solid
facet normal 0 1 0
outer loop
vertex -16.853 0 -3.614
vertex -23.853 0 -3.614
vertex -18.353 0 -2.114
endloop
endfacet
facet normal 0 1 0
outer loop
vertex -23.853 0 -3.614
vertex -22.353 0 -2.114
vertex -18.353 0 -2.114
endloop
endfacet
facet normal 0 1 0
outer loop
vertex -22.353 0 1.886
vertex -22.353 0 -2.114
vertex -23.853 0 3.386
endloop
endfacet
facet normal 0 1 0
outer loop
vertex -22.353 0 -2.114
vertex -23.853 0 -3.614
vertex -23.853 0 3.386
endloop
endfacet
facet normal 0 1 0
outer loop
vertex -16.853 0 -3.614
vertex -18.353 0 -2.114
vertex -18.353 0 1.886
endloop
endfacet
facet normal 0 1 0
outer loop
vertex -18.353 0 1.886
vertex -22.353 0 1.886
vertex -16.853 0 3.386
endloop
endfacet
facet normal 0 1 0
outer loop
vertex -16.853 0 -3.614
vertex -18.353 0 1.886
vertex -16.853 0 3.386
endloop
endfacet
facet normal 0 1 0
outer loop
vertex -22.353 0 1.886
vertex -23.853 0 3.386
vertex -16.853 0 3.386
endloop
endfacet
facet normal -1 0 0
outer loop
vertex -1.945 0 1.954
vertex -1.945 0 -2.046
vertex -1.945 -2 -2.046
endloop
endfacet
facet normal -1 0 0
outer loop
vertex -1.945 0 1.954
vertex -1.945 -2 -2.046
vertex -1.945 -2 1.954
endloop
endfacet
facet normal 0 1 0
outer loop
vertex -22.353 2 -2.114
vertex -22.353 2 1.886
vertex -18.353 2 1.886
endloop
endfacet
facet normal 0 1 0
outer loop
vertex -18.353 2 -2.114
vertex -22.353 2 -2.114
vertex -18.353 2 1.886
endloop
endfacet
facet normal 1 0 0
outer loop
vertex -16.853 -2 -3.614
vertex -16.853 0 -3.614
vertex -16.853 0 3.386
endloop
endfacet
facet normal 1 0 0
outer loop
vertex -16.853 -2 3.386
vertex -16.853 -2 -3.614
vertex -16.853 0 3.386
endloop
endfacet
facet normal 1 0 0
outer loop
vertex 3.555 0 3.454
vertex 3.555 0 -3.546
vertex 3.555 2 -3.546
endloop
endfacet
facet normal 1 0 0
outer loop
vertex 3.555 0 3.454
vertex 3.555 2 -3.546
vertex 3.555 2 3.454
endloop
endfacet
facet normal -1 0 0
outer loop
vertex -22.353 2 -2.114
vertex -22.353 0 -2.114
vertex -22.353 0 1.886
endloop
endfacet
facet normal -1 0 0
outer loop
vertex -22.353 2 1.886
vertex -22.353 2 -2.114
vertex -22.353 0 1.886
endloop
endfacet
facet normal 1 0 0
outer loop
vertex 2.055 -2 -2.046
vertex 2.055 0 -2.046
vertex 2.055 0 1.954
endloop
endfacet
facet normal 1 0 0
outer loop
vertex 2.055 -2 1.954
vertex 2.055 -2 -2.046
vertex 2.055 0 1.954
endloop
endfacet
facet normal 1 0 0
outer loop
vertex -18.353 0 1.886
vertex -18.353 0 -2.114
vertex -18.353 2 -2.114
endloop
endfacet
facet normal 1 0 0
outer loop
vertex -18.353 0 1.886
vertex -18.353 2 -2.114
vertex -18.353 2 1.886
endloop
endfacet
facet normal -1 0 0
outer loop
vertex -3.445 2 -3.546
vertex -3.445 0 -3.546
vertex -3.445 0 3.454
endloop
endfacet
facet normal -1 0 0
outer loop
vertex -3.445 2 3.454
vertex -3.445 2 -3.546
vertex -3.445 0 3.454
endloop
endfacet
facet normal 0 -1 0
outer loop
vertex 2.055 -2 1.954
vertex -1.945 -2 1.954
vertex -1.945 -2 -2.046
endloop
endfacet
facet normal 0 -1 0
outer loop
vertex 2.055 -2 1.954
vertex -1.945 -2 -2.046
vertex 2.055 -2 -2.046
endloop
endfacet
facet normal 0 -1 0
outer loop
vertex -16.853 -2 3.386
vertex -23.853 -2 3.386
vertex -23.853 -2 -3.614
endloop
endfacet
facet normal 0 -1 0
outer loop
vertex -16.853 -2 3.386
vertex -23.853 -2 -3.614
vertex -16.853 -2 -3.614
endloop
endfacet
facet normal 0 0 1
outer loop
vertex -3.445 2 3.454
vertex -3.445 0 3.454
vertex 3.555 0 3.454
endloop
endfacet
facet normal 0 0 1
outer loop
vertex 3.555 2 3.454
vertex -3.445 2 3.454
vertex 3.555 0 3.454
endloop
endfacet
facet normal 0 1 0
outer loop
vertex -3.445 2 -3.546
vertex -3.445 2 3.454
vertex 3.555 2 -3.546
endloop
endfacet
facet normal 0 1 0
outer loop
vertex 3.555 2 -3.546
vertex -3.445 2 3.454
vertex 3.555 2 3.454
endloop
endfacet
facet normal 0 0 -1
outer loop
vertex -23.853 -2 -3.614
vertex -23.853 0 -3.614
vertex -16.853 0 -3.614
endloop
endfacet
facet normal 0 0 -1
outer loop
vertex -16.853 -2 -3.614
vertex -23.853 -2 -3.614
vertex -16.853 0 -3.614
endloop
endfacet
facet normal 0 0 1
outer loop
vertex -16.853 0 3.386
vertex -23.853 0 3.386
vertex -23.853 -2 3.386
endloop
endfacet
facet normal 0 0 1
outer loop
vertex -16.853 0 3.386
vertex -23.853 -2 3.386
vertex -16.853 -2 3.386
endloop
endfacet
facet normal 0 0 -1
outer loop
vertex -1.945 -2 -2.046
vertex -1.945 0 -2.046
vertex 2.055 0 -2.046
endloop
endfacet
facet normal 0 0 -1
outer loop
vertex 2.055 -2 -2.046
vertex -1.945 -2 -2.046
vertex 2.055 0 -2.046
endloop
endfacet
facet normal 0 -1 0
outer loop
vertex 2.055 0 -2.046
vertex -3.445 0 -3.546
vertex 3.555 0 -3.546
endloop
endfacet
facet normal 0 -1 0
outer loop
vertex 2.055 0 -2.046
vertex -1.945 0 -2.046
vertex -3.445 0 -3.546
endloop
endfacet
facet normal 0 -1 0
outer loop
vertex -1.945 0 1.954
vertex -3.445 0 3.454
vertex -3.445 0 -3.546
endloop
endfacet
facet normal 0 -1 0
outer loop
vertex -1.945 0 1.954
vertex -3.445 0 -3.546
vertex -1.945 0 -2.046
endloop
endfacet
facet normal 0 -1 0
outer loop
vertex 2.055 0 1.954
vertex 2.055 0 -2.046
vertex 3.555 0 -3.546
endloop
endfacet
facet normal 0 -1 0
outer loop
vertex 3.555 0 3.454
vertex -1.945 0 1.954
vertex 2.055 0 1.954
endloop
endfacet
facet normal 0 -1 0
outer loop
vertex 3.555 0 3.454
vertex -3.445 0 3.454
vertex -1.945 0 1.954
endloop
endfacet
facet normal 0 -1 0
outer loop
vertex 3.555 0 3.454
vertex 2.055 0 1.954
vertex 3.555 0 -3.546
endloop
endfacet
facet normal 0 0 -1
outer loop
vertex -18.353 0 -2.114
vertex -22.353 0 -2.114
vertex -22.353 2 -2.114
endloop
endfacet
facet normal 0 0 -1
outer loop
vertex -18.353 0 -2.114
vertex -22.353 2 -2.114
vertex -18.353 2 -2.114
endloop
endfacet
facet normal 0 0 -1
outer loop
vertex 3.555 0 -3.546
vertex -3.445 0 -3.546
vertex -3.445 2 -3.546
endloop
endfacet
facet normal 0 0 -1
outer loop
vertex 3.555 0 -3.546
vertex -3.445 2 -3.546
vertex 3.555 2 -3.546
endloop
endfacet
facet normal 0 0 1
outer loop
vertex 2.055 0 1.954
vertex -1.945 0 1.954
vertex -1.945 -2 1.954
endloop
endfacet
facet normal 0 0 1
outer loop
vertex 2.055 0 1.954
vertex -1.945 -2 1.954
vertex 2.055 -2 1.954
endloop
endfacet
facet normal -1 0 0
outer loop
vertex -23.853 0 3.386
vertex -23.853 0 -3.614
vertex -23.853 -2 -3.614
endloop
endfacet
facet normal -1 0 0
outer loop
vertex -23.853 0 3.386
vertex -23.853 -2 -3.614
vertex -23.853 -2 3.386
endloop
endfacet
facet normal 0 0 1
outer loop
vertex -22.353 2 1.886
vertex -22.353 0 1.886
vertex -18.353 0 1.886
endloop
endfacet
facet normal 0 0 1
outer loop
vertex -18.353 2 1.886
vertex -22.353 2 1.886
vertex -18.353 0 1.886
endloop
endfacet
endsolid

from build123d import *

# Parameters (mm, degrees)
F0_W     = 4
F0_H     = 4
F1_DEPTH = 2
F0_W_2   = 7
F0_H_2   = 7
F2_DEPTH = 2
F3_DEPTH = 2
F4_DEPTH = 2


with BuildPart() as f1:
    # F0 (on Front) → F1 (new body)
    with BuildSketch(Plane.XZ):
        with Locations((0.055232, -0.046305)):
            Rectangle(F0_W, F0_H)
    extrude(amount=F1_DEPTH)

    # F0 (on Front) → F2 (join)
    with BuildSketch(Plane.XZ):
        with Locations((0.055232, -0.046305)):
            Rectangle(F0_W_2, F0_H_2)
        with Locations((0.055232, -0.046305)):
            Rectangle(F0_W, F0_H, mode=Mode.SUBTRACT)
        with Locations((0.055232, -0.046305)):
            Rectangle(F0_W, F0_H)
    extrude(amount=-F2_DEPTH)


with BuildPart() as f3:
    # F0 (on Front) → F3 (new body)
    with BuildSketch(Plane.XZ):
        with Locations((-20.352559, -0.113686)):
            Rectangle(F0_W, F0_H)
    extrude(amount=-F3_DEPTH)

    # F0 (on Front) → F4 (join)
    with BuildSketch(Plane.XZ):
        with Locations((-20.352559, -0.113686)):
            Rectangle(F0_W_2, F0_H_2)
        with Locations((-20.352559, -0.113686)):
            Rectangle(F0_W, F0_H, mode=Mode.SUBTRACT)
        with Locations((-20.352559, -0.113686)):
            Rectangle(F0_W, F0_H)
    extrude(amount=F4_DEPTH)


solid = Compound([f1.part, f3.part])
